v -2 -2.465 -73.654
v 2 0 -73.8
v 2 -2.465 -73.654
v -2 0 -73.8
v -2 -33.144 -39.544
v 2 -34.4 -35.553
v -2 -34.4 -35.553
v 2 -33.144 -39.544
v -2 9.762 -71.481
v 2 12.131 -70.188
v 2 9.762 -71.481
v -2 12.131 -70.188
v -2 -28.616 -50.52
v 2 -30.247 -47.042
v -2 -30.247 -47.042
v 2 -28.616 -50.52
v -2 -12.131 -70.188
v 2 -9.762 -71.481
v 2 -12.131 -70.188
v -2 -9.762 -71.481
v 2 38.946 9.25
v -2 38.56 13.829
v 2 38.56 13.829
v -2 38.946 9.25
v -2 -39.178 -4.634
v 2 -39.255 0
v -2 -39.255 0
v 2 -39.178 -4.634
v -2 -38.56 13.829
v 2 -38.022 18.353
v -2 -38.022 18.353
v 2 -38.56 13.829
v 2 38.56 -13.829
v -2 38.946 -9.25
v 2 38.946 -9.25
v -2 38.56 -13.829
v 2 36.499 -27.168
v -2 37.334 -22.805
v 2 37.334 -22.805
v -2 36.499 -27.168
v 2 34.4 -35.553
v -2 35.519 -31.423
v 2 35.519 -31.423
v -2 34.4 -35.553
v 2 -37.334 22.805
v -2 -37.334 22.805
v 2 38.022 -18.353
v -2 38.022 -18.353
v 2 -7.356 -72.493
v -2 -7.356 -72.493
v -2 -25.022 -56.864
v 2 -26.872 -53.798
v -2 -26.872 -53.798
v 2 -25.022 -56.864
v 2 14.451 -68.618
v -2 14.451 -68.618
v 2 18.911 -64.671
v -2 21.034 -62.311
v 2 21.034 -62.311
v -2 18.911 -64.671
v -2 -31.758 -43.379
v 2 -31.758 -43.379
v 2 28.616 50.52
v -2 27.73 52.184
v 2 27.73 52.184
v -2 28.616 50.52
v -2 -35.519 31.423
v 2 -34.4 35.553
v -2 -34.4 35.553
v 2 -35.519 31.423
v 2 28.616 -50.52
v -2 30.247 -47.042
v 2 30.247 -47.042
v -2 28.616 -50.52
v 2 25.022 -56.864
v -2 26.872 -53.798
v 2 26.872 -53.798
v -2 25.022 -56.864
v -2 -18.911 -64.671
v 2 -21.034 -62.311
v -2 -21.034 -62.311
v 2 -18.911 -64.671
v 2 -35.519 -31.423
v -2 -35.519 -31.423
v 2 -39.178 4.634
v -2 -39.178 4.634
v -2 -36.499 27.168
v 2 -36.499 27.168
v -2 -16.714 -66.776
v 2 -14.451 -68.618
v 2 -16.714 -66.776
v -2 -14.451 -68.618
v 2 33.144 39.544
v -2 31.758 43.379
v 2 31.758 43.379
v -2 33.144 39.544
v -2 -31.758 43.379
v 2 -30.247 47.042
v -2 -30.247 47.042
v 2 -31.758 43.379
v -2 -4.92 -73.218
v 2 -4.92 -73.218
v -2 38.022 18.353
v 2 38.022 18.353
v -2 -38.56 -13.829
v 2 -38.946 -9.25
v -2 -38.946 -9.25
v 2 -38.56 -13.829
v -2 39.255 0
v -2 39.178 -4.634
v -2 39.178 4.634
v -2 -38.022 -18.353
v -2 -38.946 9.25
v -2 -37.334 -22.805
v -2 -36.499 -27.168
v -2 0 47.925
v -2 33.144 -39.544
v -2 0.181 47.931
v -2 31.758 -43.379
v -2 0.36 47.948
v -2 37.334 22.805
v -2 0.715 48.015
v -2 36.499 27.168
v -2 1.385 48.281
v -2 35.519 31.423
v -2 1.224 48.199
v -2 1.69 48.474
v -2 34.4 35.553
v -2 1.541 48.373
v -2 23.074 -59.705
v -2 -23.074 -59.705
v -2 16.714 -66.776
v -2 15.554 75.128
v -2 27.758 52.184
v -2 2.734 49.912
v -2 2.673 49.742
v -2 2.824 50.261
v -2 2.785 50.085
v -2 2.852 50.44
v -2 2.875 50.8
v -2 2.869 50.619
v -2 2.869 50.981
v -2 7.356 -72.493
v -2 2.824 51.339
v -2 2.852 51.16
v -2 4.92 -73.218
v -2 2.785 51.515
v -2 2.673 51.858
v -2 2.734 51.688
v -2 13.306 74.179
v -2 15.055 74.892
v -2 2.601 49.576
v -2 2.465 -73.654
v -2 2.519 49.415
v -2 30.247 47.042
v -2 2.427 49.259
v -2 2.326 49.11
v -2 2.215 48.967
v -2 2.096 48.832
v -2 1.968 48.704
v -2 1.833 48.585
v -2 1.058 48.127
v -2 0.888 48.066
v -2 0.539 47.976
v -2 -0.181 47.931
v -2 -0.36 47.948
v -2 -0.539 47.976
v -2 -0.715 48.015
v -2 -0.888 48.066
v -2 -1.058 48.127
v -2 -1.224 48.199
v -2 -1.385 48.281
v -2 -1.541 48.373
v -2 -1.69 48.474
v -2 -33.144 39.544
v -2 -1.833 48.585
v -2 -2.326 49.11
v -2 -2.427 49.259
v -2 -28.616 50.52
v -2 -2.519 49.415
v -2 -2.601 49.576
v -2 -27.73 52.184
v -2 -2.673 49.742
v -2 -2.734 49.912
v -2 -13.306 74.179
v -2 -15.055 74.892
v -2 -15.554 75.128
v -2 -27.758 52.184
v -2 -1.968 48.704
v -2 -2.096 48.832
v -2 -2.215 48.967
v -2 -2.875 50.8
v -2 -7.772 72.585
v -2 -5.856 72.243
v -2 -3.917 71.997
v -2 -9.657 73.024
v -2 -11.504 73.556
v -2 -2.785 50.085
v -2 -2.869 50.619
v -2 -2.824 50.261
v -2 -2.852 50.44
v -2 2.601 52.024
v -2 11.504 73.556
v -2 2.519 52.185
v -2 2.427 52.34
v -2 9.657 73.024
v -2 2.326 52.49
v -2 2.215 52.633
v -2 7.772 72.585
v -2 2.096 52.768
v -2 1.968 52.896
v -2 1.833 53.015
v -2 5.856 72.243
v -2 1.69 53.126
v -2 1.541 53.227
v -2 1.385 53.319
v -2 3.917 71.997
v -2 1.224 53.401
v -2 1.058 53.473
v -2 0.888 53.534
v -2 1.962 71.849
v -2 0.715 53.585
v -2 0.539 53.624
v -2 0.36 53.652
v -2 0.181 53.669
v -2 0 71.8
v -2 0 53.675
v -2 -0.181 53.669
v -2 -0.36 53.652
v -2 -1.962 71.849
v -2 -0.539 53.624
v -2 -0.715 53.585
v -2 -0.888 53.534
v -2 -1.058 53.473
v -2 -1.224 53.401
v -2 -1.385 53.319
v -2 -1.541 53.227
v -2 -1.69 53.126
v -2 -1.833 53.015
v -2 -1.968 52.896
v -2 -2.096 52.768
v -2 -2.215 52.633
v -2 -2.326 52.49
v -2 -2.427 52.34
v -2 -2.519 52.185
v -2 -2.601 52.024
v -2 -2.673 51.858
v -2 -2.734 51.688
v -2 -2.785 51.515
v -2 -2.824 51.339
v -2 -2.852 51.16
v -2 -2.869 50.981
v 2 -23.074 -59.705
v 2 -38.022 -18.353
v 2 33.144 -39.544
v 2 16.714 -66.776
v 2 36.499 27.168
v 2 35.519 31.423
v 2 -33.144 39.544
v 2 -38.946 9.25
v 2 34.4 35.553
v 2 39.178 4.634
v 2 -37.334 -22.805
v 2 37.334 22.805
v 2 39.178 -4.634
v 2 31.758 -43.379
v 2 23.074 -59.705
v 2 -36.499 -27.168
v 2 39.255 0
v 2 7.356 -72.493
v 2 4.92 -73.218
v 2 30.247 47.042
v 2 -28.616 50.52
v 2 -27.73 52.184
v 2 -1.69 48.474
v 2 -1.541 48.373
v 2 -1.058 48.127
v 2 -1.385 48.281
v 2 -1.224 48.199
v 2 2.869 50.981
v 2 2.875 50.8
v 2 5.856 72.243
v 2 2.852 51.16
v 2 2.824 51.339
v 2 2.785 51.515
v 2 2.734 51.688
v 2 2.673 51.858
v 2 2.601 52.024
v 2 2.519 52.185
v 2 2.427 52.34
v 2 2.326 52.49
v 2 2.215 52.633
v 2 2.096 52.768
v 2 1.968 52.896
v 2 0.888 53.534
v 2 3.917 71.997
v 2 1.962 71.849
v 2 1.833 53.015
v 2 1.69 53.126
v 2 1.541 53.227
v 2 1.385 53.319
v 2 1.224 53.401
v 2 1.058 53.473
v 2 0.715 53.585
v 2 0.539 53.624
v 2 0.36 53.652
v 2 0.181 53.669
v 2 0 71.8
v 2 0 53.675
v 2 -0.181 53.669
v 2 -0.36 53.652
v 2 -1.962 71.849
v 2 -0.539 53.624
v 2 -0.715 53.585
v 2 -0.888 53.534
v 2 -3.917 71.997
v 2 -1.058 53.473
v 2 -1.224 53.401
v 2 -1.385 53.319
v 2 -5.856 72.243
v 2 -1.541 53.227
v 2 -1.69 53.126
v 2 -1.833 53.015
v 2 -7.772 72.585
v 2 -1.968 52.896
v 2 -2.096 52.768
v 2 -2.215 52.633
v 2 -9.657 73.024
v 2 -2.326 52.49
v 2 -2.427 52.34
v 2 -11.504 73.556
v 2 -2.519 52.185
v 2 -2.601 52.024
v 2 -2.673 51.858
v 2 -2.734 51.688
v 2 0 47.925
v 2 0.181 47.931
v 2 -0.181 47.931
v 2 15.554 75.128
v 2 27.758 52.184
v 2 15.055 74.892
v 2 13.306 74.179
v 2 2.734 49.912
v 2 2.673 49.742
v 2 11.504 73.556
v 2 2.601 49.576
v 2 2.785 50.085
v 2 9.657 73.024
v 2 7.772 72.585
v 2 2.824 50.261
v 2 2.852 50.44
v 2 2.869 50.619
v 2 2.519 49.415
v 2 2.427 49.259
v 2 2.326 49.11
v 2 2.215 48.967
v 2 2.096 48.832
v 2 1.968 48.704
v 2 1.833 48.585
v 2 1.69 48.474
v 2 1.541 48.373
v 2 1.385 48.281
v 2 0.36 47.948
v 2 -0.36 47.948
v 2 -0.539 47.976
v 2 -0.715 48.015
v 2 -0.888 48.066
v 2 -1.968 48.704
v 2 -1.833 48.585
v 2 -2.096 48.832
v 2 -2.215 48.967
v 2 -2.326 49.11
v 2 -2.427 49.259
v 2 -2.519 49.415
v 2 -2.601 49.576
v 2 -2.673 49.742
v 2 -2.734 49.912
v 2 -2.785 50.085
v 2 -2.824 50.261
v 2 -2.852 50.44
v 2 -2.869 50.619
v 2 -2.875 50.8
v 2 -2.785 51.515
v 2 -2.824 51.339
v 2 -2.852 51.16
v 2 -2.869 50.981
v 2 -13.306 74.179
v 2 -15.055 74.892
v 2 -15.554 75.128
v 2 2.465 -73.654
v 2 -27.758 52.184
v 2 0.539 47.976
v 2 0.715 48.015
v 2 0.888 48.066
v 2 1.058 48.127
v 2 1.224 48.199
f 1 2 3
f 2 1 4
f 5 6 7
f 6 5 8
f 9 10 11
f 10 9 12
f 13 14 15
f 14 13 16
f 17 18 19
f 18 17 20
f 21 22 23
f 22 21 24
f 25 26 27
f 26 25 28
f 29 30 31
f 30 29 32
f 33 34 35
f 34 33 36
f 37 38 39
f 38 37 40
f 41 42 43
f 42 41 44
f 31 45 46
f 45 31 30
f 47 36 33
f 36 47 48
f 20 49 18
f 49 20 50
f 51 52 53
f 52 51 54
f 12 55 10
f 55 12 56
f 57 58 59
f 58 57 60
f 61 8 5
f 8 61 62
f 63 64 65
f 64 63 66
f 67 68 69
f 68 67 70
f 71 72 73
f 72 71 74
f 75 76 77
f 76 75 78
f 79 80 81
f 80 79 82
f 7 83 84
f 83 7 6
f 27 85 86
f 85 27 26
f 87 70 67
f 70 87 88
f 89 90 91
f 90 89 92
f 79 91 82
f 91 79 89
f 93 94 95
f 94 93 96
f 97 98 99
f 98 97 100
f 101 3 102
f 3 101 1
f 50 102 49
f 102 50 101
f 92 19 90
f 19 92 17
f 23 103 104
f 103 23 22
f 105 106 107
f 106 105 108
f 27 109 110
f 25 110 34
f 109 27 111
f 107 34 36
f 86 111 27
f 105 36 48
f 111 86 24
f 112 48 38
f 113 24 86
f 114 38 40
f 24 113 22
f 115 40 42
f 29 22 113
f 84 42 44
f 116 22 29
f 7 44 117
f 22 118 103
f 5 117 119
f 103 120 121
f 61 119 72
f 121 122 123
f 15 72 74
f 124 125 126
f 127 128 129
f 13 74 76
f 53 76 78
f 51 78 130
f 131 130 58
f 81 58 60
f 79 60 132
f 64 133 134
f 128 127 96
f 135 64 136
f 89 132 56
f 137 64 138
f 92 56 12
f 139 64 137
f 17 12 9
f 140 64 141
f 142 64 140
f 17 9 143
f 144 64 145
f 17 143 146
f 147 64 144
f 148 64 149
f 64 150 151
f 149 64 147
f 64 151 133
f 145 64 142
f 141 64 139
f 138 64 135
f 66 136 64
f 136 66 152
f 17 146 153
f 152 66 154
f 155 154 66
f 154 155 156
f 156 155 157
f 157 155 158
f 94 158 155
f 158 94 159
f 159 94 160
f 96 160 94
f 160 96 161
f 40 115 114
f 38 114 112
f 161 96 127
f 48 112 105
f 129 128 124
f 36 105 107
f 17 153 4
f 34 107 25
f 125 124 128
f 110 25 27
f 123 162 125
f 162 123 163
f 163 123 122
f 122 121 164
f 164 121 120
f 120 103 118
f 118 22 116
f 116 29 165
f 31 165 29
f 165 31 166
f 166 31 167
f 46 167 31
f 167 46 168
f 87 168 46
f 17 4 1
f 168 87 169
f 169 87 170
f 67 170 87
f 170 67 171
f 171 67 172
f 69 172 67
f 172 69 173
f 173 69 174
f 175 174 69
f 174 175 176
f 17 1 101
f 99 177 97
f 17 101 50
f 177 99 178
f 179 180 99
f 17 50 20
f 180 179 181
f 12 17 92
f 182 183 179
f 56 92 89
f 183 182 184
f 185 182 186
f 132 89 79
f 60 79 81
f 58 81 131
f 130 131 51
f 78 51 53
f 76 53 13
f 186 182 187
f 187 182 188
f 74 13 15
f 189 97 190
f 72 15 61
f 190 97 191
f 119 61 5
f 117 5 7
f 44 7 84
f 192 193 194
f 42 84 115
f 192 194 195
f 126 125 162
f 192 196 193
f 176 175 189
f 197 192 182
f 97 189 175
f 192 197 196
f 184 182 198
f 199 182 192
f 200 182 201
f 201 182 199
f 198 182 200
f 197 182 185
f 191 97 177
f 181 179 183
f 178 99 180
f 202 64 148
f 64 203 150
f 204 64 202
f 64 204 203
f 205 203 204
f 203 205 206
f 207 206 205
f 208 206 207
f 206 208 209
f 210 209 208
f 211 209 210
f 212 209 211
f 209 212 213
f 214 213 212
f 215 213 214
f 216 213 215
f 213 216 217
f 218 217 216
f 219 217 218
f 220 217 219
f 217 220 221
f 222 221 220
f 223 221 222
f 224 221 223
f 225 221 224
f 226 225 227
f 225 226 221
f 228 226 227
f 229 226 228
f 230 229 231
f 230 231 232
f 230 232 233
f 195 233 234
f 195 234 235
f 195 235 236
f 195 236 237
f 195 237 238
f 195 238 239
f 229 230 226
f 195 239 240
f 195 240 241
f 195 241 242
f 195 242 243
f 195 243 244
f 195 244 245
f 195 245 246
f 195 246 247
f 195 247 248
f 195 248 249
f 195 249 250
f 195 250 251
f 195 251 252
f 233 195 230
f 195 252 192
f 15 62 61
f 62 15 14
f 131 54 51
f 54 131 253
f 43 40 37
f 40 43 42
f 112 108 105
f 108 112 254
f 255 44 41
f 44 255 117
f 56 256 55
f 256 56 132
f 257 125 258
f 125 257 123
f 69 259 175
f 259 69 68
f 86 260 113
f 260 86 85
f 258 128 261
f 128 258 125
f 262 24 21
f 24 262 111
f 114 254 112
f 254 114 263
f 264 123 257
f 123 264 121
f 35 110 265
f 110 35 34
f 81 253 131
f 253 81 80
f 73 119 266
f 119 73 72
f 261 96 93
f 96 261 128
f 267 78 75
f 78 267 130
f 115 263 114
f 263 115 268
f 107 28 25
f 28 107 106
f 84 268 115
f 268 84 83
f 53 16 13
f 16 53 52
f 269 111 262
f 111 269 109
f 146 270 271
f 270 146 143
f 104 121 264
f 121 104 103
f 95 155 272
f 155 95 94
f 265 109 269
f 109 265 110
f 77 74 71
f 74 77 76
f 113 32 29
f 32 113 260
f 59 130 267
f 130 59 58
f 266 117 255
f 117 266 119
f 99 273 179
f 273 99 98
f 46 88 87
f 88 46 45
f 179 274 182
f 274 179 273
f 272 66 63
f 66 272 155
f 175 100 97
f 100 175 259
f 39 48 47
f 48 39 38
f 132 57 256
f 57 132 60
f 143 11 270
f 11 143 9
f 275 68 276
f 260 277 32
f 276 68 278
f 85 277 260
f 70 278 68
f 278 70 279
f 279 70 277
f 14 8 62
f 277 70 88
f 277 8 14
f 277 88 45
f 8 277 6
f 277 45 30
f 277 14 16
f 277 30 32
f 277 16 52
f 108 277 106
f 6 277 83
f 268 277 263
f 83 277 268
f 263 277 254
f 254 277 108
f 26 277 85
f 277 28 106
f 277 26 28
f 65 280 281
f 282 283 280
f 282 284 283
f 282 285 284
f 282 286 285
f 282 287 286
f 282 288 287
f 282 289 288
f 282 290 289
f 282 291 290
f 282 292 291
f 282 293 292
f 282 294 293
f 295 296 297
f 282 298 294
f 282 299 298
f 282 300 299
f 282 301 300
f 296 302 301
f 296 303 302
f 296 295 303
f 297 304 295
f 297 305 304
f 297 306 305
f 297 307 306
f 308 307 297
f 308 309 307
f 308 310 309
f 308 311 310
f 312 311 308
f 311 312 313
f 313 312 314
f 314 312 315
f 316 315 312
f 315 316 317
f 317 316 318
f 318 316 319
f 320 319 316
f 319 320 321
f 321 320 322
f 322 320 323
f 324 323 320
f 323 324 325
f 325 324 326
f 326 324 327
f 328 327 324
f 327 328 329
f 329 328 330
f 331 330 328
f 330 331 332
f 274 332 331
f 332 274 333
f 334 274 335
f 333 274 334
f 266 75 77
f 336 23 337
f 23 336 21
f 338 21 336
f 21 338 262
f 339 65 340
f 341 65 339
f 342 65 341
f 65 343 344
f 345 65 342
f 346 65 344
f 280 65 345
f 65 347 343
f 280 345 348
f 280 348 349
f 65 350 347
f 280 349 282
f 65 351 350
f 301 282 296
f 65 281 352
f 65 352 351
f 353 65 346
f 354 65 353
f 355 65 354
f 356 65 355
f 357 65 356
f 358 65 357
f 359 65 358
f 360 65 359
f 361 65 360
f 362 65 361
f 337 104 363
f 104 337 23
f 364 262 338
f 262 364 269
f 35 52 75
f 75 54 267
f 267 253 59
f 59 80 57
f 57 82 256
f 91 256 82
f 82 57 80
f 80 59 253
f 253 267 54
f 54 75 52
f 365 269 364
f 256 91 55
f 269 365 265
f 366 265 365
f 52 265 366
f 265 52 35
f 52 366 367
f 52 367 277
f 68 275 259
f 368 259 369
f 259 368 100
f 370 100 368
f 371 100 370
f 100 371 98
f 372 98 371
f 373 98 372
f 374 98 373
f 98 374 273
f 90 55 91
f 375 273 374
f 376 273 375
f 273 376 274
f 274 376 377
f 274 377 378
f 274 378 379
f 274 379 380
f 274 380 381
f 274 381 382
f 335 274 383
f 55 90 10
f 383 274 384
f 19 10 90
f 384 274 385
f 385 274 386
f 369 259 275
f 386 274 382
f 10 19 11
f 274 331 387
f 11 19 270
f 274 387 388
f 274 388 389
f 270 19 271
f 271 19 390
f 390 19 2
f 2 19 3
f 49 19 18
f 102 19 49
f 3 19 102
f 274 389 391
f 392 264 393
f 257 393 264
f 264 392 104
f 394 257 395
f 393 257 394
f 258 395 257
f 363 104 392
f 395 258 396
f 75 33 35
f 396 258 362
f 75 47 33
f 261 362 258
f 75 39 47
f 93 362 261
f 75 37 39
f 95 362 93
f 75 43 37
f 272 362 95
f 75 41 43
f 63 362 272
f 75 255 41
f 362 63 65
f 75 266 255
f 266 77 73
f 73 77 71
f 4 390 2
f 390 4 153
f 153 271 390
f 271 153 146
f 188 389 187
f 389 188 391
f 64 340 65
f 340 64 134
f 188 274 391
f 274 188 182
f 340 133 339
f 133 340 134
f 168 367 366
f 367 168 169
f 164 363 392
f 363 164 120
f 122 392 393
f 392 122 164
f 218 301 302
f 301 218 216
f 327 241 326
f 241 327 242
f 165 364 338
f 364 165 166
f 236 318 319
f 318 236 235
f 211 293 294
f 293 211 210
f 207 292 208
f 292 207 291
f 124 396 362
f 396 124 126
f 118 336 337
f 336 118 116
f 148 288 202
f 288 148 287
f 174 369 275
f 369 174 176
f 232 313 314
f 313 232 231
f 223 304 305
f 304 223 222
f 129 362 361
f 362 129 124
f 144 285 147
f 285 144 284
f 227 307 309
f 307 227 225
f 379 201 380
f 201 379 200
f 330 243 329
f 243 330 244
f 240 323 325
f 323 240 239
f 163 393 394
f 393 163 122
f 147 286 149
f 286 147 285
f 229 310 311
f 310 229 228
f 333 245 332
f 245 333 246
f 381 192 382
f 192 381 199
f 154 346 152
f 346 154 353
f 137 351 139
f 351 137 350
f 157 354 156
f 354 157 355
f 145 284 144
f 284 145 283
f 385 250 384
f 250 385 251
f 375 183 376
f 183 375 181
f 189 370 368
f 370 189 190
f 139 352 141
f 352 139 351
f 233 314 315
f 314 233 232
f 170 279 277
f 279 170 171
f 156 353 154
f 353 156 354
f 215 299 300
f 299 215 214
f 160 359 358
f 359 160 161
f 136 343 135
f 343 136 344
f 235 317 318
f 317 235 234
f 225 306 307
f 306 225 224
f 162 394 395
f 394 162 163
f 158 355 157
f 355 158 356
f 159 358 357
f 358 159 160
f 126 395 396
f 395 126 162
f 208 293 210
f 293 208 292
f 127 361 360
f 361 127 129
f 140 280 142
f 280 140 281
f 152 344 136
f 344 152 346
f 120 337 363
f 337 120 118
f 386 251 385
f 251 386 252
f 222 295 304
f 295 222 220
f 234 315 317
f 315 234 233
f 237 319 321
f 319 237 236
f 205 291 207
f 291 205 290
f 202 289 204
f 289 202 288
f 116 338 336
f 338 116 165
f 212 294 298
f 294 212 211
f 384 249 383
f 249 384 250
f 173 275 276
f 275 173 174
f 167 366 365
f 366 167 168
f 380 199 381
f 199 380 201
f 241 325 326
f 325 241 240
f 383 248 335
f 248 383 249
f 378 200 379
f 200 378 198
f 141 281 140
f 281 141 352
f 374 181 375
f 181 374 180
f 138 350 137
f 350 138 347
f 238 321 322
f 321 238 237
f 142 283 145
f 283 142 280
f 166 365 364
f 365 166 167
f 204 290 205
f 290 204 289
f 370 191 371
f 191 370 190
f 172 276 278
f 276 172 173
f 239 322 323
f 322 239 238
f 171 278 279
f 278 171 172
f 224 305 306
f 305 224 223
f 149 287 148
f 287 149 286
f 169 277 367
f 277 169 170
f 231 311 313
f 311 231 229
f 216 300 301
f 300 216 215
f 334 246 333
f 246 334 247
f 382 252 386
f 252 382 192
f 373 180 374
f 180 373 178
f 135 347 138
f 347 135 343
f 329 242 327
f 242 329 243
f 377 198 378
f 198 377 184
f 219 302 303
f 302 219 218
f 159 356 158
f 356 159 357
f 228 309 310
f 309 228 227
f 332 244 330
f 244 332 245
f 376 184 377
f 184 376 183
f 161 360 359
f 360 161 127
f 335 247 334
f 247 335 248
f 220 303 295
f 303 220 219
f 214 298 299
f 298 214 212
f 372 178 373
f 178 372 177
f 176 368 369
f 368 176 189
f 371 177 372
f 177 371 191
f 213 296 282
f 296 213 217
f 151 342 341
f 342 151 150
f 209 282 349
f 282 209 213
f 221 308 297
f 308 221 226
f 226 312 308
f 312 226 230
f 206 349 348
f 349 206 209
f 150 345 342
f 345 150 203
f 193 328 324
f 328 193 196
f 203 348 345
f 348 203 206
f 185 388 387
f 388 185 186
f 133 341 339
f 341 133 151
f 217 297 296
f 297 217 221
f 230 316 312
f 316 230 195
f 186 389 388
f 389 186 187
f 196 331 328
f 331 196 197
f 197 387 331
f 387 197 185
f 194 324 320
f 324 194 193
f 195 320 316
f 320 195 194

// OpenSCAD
/* From http://www.thingiverse.com/thing:3457
   © 2010 whosawhatsis

   This program is free software: you can redistribute it and/or modify
   it under the terms of the GNU Lesser General Public License as published by
   the Free Software Foundation, either version 3 of the License, or
   (at your option) any later version.

   This program is distributed in the hope that it will be useful,
   but WITHOUT ANY WARRANTY; without even the implied warranty of
   MERCHANTABILITY or FITNESS FOR A PARTICULAR PURPOSE. See the
   GNU Lesser General Public License for more details.

   You should have received a copy of the GNU Lesser General Public License
   along with this program. If not, see <http://www.gnu.org/licenses/>.
*/

/*
This script generates a teardrop shape at the appropriate angle to prevent overhangs greater than 45 degrees. The angle
is in degrees, and is a rotation around the Y axis. You can then rotate around Z to point it in any direction. Rotation
around X or Y will cause the angle to be wrong.
*/

module teardrop(radius, length, angle)
{
    rotate([ 0, angle, 0 ]) union()
    {
        linear_extrude(height = length, center = true, convexity = radius, twist = 0) circle(r = radius, $fn = 100);
        linear_extrude(height = length, center = true, convexity = radius, twist = 0) projection(cut = false)
            rotate([ 0, -angle, 0 ]) translate([ 0, 0, radius * sin(45) * 1.5 ])
                cylinder(h = radius * sin(45), r1 = radius * sin(45), r2 = 0, center = true, $fn = 100);
    }

    // I worked this portion out when a bug was causing the projection above to take FOREVER to calculate. It works as a
    // replacement, and I figured I'd leave it here just in case.
    /*
        #polygon(points = [[radius * cos(-angle / 2), radius * sin(-angle / 2), 0],[radius * cos(-angle / 2), radius *
       -sin(-angle / 2), 0],[(sin(-angle - 45) + cos(-angle - 45)) * radius, 0, 0]], paths = [[0, 1, 2]]);
        #polygon(points = [[radius * -cos(-angle / 2), radius * sin(-angle / 2), 0],[radius * -cos(-angle / 2), radius *
       -sin(-angle / 2), 0],[(sin(-angle - 45) + cos(-angle - 45)) * radius, 0, 0]], paths = [[0, 1, 2]]);
        #polygon(points = [[radius * sin(-angle / 2), radius * cos(-angle / 2), 0],[radius * sin(-angle / 2), radius *
       -cos(-angle / 2), 0],[(sin(-angle - 45) + cos(-angle - 45)) * radius, 0, 0]], paths = [[0, 1, 2]]);
    */
}

/*
 * Simple intersection method to implement a flat/truncated teardrop
 */
module flat_teardrop(radius, length, angle)
{
    intersection()
    {
        rotate([ 0, angle, 0 ])
        {
            cube(size = [ radius * 2, radius * 2, length ], center = true);
        }
        teardrop(radius, length, angle);
    }
}

module test_teardrop()
{
    translate([ 0, -15, 0 ]) teardrop(5, 20, 90);
    translate([ 0, 0, 0 ]) teardrop(5, 20, 60);
    translate([ 0, 15, 0 ]) teardrop(5, 20, 45);
}

$fn = 100;

width = 4;
scaling = 1.88;
total_len = 125 + 22.6;
bottom_to_circle = 23;
difference()
{
    scale([ 1, 1, scaling ]) teardrop((total_len / 2) / scaling, width, 90);
    color("red") translate([ 0, 0, (total_len / 2) - bottom_to_circle ]) rotate([ 0, 90, 0 ])
        cylinder(h = width, r = 5.75 / 2, center = true);
    color("green") scale([ 1, 1.25, 1 ]) translate([ 0, 0, (total_len / 2) + bottom_to_circle ]) rotate([ 0, 90, 0 ])
        cylinder(h = width, r = 25, center = true);
}
